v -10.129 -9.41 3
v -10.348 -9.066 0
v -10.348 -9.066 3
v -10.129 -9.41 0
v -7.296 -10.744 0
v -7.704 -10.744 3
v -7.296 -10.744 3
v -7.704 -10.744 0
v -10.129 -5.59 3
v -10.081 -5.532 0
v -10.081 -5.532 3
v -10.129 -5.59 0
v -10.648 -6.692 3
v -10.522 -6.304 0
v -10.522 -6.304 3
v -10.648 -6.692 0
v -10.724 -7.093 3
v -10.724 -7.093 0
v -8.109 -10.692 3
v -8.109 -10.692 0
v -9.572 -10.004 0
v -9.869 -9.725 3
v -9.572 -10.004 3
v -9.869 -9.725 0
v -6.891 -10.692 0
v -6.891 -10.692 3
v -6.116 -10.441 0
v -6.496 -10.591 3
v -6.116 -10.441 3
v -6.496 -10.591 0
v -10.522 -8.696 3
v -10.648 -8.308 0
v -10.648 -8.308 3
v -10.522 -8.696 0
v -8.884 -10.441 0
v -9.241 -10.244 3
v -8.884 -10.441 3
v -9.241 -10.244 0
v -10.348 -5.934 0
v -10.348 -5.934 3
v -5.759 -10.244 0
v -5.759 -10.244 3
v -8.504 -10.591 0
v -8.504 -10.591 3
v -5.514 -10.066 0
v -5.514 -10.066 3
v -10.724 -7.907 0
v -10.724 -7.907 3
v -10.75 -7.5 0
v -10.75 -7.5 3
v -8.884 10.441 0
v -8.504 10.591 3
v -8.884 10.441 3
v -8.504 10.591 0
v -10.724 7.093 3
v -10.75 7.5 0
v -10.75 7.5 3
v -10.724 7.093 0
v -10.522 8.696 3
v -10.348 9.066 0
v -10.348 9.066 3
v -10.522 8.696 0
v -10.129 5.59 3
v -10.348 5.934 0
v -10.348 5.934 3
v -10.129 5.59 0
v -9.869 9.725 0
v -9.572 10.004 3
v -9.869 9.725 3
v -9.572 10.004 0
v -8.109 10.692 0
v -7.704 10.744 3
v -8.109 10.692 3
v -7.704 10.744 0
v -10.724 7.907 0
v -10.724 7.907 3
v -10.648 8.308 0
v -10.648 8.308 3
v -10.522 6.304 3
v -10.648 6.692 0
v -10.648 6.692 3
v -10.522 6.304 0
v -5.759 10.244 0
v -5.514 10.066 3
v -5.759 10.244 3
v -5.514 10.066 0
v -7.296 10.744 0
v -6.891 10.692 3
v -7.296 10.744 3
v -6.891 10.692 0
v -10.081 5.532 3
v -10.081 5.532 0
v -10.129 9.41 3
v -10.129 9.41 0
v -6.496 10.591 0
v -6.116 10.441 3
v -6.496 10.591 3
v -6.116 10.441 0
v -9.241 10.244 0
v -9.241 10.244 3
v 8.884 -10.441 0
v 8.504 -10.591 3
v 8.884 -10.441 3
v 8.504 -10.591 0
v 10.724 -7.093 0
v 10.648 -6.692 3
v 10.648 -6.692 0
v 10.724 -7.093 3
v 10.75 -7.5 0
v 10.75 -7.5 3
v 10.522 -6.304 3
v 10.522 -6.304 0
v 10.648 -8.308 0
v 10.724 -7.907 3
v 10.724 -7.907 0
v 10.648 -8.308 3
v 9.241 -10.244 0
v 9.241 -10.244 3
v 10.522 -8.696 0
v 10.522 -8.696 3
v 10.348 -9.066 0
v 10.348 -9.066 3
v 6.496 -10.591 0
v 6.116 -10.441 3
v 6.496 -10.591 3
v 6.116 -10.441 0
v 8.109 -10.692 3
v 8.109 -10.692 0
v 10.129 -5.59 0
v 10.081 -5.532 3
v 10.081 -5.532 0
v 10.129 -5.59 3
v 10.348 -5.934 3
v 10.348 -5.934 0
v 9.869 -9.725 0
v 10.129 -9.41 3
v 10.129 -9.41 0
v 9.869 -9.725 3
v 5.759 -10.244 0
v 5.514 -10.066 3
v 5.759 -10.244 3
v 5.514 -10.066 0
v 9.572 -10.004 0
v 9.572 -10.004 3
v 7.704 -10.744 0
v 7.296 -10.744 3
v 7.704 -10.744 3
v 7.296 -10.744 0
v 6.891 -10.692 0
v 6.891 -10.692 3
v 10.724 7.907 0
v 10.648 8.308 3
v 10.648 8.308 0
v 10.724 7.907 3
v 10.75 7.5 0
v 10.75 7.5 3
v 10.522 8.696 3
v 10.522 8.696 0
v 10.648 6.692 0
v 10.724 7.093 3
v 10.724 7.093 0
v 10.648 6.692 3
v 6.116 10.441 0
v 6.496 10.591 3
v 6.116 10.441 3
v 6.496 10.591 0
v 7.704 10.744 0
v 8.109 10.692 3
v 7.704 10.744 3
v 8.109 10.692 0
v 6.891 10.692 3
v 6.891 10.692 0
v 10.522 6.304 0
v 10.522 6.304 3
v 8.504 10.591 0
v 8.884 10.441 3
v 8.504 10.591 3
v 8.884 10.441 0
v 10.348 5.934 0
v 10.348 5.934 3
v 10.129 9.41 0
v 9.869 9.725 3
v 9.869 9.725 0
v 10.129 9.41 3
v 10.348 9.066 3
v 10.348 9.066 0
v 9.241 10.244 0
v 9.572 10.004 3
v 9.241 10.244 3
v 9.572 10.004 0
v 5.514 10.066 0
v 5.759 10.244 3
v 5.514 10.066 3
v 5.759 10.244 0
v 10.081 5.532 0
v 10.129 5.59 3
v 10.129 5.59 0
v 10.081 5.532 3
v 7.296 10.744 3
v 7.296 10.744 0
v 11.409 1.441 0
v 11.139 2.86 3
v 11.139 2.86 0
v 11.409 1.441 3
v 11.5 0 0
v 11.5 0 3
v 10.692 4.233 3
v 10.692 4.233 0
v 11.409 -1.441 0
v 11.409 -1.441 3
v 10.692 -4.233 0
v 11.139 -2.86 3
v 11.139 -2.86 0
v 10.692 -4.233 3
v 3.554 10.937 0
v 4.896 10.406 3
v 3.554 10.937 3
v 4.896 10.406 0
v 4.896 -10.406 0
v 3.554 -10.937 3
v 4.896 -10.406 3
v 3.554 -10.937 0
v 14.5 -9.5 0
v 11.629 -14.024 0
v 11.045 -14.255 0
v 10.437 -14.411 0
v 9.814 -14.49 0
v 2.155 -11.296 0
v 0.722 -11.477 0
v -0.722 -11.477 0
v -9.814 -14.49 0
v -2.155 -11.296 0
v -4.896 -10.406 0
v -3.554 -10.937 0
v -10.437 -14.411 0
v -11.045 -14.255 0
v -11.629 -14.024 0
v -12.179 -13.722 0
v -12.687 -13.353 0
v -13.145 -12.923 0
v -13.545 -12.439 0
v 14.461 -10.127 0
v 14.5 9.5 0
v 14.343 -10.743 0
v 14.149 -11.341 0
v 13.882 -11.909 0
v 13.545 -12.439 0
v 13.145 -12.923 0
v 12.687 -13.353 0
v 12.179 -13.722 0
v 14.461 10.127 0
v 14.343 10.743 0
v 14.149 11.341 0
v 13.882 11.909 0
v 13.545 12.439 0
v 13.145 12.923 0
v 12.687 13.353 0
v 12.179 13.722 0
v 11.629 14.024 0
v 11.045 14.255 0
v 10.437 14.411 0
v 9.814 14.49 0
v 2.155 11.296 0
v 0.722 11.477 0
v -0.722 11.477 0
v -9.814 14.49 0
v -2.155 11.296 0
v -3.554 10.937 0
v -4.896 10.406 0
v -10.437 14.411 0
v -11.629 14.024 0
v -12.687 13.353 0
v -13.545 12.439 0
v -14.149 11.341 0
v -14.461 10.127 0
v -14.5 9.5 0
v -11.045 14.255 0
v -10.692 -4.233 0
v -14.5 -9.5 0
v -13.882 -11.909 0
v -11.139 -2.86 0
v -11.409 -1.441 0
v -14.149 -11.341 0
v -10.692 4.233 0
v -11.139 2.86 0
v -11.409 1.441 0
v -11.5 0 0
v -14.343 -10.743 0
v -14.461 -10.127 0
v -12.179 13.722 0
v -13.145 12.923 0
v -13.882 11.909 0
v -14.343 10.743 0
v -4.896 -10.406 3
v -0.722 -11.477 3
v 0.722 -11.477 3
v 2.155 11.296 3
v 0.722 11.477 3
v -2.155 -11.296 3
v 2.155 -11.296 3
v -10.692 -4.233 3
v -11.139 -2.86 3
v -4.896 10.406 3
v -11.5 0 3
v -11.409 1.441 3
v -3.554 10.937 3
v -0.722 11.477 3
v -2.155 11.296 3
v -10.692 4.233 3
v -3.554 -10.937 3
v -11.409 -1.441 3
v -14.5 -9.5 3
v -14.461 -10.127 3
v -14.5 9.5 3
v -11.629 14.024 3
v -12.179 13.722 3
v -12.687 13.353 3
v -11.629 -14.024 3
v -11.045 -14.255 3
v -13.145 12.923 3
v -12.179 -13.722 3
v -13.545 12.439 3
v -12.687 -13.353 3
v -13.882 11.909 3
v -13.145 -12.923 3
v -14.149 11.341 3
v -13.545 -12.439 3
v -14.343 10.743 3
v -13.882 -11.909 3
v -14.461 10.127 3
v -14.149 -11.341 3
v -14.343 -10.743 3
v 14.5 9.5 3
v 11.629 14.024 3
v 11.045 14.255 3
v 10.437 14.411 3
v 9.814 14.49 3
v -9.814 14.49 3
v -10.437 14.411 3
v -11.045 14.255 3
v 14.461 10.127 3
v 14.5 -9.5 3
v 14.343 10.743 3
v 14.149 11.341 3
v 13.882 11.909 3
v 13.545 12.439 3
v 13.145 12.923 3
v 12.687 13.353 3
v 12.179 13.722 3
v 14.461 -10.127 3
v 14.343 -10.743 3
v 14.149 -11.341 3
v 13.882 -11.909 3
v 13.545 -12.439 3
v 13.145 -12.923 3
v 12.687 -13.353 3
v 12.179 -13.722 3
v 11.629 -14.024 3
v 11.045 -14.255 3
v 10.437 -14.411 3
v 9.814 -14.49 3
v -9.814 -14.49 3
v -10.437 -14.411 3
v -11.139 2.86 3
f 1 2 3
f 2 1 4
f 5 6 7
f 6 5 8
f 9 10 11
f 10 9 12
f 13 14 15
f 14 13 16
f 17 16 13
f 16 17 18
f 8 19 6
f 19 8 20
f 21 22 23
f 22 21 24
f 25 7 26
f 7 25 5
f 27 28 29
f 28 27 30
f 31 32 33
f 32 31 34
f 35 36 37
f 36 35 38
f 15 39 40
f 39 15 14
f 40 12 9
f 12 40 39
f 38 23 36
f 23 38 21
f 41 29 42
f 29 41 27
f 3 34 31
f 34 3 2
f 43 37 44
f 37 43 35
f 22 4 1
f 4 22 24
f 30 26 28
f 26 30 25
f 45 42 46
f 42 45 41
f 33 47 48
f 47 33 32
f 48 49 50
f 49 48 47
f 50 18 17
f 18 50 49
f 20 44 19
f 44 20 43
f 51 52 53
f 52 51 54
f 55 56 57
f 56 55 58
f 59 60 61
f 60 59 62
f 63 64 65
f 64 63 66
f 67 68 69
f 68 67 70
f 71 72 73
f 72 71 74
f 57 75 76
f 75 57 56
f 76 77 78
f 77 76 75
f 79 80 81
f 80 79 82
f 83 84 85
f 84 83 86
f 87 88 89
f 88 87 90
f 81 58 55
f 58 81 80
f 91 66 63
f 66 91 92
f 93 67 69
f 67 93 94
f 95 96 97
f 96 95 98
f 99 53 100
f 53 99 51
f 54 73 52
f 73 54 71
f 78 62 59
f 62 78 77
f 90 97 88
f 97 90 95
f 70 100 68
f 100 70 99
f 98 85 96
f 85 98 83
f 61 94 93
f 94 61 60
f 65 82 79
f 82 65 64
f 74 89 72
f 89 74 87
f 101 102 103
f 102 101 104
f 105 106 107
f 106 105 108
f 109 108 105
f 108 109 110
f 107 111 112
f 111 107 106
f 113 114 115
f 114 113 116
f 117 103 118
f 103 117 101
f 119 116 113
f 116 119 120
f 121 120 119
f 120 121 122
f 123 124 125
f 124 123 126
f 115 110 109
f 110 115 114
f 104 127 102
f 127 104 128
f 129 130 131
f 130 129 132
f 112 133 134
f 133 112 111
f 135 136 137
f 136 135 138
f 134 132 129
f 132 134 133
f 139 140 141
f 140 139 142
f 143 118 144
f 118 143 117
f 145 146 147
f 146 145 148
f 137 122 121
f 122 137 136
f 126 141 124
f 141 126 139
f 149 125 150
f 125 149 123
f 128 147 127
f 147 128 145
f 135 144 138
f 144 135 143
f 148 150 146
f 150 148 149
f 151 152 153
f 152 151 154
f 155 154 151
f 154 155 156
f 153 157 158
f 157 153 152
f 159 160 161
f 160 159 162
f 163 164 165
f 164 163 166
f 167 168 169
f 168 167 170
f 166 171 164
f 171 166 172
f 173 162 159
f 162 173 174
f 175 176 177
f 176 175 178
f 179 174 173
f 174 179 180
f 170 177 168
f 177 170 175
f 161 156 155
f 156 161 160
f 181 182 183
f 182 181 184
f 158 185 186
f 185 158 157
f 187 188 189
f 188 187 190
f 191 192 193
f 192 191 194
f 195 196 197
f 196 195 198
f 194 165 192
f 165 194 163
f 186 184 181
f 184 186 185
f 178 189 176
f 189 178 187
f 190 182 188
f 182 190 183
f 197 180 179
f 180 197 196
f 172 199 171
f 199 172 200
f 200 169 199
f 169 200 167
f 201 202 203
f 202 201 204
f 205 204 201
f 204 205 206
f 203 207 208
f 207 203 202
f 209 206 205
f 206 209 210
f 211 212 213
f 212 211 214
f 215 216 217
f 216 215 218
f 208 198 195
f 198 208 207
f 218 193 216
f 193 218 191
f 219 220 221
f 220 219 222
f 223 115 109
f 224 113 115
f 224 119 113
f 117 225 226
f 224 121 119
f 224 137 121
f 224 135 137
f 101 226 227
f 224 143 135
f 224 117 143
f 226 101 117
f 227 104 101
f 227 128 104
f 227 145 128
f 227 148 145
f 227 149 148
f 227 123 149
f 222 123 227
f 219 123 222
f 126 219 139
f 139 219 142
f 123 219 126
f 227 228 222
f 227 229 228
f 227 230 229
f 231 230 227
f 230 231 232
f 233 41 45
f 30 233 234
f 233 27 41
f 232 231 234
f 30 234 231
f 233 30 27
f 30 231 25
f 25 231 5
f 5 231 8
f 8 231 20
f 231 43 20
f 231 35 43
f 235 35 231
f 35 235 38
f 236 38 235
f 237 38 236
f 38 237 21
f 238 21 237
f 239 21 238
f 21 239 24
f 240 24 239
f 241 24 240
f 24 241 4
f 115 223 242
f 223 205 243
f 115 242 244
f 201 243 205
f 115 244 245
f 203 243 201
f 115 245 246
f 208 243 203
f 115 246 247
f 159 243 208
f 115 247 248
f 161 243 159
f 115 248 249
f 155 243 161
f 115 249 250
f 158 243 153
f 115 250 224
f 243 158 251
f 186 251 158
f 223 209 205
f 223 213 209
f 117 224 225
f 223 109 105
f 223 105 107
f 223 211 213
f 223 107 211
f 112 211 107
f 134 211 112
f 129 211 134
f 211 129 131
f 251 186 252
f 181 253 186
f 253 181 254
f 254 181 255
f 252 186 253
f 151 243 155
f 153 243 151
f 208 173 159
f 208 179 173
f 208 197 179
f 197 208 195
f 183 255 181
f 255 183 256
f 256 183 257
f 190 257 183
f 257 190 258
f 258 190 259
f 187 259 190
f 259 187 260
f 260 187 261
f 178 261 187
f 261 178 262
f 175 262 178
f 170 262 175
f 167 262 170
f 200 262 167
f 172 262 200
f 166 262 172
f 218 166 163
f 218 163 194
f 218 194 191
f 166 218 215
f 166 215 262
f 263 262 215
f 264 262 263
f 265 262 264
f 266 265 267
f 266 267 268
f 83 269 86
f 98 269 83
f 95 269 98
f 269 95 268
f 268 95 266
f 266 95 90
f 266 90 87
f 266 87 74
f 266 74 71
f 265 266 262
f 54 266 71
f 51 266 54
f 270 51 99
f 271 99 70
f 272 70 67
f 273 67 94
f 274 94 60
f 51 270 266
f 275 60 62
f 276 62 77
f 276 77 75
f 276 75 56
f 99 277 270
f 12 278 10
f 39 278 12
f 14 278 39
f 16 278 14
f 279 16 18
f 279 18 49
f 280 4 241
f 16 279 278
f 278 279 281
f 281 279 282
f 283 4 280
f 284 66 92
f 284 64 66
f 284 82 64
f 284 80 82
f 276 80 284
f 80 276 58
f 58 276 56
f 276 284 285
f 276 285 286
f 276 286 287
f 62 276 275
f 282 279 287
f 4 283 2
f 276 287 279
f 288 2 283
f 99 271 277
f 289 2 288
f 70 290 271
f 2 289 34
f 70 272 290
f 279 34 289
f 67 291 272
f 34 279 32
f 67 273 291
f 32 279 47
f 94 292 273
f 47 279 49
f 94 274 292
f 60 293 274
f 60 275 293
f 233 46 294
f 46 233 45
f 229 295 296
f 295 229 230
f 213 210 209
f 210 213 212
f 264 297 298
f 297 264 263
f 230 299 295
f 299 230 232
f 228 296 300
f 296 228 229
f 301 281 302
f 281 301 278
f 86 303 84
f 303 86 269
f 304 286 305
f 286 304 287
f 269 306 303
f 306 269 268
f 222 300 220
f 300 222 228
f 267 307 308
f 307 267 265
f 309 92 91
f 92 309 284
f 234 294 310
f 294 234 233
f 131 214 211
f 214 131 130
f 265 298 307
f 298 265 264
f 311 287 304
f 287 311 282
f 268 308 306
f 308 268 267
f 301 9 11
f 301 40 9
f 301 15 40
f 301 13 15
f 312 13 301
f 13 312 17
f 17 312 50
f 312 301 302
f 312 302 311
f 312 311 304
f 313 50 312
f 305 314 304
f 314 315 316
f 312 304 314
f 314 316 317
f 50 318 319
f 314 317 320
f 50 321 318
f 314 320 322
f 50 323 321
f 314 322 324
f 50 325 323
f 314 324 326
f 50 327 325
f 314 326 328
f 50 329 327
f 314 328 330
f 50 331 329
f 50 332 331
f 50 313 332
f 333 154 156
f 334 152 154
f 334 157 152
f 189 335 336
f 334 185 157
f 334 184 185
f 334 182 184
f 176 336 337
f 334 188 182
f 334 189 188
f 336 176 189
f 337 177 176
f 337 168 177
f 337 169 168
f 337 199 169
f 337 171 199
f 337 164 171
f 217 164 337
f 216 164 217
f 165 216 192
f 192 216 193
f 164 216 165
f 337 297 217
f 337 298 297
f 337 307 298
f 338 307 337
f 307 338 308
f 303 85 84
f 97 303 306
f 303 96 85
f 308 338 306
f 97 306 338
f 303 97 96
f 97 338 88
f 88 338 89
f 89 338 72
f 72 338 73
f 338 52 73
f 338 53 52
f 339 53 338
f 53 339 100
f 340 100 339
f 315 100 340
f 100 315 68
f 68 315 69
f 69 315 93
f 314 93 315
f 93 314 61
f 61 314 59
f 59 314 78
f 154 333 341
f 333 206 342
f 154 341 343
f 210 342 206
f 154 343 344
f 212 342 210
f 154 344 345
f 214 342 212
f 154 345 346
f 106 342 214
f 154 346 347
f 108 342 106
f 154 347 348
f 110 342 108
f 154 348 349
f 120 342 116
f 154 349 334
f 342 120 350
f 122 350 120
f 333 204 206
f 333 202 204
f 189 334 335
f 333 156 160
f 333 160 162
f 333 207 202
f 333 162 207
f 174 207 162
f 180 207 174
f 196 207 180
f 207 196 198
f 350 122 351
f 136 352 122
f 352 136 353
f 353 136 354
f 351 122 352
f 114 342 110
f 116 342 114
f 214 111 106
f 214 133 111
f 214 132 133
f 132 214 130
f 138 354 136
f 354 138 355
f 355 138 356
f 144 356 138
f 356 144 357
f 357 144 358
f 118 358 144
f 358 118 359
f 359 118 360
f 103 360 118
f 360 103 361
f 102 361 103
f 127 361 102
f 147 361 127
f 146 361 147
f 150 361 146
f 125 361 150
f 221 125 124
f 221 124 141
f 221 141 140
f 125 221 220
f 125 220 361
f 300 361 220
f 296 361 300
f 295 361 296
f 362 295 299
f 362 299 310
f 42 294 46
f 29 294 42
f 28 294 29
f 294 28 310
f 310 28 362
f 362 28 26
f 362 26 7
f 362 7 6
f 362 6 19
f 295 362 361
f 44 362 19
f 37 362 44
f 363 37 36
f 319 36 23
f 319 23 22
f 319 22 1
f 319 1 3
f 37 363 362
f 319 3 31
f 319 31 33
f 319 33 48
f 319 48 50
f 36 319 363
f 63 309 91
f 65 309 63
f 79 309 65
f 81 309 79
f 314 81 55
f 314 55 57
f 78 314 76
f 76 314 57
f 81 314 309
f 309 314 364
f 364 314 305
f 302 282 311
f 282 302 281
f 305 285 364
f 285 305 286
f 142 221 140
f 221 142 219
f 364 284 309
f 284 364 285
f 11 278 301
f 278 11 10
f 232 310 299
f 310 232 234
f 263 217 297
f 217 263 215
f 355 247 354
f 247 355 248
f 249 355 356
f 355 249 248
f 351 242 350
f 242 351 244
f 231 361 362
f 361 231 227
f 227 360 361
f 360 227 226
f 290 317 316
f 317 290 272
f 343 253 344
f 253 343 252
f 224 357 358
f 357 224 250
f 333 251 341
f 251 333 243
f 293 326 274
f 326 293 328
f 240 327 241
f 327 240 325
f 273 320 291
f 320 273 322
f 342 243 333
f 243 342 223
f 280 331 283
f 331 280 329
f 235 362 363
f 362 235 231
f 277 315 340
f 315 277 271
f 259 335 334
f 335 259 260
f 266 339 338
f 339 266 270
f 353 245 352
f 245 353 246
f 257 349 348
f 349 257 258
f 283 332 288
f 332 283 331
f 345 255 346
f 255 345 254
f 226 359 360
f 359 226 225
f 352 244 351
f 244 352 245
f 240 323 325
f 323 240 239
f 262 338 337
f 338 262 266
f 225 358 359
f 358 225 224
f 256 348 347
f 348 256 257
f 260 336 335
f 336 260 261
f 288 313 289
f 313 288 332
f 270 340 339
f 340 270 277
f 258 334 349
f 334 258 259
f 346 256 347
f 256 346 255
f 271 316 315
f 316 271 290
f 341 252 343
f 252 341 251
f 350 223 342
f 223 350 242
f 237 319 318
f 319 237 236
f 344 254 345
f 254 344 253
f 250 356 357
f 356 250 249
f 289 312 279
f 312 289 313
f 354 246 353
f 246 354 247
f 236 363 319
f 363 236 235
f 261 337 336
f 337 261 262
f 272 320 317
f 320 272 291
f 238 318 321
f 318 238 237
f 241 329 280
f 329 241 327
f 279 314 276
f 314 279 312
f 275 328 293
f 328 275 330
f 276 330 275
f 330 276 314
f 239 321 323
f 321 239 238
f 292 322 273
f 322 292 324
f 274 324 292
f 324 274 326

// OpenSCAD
$fn = 50;


difference() {
	union() {
		hull() {
			translate(v = [-9.5000000000, 9.5000000000, 0]) {
				cylinder(h = 3, r = 5);
			}
			translate(v = [9.5000000000, 9.5000000000, 0]) {
				cylinder(h = 3, r = 5);
			}
			translate(v = [-9.5000000000, -9.5000000000, 0]) {
				cylinder(h = 3, r = 5);
			}
			translate(v = [9.5000000000, -9.5000000000, 0]) {
				cylinder(h = 3, r = 5);
			}
		}
	}
	union() {
		#translate(v = [-7.5000000000, -7.5000000000, -100.0000000000]) {
			cylinder(h = 200, r = 3.2500000000);
		}
		#translate(v = [-7.5000000000, 7.5000000000, -100.0000000000]) {
			cylinder(h = 200, r = 3.2500000000);
		}
		#translate(v = [7.5000000000, -7.5000000000, -100.0000000000]) {
			cylinder(h = 200, r = 3.2500000000);
		}
		#translate(v = [7.5000000000, 7.5000000000, -100.0000000000]) {
			cylinder(h = 200, r = 3.2500000000);
		}
		#cylinder(h = 3, r = 11.5000000000);
	}
}
